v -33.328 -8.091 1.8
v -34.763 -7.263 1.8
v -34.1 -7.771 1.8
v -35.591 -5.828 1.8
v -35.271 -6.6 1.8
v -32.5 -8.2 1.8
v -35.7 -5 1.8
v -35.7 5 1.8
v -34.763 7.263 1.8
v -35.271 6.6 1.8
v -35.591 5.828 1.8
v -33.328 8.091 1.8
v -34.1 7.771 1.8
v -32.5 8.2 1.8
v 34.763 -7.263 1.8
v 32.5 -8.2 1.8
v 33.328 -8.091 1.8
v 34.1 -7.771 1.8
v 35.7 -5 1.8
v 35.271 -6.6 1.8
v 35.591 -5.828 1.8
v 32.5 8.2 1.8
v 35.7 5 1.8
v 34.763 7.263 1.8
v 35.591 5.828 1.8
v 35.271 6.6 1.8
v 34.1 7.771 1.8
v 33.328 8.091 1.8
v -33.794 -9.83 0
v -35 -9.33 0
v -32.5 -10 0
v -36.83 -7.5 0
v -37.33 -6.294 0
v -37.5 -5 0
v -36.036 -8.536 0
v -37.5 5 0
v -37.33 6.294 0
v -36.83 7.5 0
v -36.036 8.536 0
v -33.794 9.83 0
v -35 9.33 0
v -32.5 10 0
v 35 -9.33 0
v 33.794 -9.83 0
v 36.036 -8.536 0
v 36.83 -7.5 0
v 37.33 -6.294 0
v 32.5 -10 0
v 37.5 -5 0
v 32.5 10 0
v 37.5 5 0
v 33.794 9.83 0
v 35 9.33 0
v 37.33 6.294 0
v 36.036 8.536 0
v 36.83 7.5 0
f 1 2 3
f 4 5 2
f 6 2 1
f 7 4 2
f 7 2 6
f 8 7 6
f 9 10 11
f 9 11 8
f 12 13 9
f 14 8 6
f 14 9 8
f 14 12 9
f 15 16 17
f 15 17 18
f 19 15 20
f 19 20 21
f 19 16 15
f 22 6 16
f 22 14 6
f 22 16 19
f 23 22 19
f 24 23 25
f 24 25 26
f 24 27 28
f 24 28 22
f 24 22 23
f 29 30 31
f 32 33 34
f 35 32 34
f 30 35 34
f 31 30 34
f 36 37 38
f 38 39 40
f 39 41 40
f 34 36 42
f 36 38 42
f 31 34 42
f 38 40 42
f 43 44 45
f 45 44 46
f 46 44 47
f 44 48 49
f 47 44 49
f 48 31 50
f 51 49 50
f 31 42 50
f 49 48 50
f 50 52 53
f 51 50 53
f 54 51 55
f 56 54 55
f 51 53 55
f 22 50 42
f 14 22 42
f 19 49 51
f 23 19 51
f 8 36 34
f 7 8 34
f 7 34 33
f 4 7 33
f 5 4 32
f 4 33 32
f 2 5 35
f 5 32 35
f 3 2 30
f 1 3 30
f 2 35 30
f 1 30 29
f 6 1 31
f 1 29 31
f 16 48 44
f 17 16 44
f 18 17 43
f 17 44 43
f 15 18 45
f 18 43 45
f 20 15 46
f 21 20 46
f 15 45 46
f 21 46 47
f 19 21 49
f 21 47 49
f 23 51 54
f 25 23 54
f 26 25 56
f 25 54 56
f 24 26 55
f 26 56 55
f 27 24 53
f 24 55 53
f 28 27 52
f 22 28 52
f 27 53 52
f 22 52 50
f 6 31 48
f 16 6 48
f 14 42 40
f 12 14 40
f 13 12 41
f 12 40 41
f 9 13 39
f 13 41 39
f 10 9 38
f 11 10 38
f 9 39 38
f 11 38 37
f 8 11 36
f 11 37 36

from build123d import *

# Parameters (mm, degrees)
F0_W     = 75
F0_H     = 20
F1_DEPTH = 1.8
F2_R     = 5
F3_SIZE  = 1.79999


# Not quite as in the source:
# - a fillet or chamfer is up to 0.001 mm smaller than in the source, because OpenCascade refuses the exact size


with BuildPart() as f1:
    # F0 (on Top) → F1 (new body)
    with BuildSketch(Plane.XY):
        Rectangle(F0_W, F0_H)
    extrude(amount=F1_DEPTH)

    # F2
    f2_edges = [f1.edges().sort_by_distance(p)[0] for p in [
        (-37.5, -10, 0.9),
        (-37.5, 10, 0.9),
        (37.5, -10, 0.9),
        (37.5, 10, 0.9),
    ]]
    fillet(f2_edges, radius=F2_R)

    # F3 (size 1.8 in the source; OpenCascade refuses exactly that, so slightly less here)
    f3_edges = [f1.edges().sort_by_distance(p)[0] for p in [
        (0, -10, 1.8),
        (-36.035534, -8.535534, 1.8),
        (36.035534, -8.535534, 1.8),
        (-37.5, 0, 1.8),
        (37.5, 0, 1.8),
        (-36.035534, 8.535534, 1.8),
        (36.035534, 8.535534, 1.8),
        (0, 10, 1.8),
    ]]
    chamfer(f3_edges, length=F3_SIZE)


solid = f1.part
